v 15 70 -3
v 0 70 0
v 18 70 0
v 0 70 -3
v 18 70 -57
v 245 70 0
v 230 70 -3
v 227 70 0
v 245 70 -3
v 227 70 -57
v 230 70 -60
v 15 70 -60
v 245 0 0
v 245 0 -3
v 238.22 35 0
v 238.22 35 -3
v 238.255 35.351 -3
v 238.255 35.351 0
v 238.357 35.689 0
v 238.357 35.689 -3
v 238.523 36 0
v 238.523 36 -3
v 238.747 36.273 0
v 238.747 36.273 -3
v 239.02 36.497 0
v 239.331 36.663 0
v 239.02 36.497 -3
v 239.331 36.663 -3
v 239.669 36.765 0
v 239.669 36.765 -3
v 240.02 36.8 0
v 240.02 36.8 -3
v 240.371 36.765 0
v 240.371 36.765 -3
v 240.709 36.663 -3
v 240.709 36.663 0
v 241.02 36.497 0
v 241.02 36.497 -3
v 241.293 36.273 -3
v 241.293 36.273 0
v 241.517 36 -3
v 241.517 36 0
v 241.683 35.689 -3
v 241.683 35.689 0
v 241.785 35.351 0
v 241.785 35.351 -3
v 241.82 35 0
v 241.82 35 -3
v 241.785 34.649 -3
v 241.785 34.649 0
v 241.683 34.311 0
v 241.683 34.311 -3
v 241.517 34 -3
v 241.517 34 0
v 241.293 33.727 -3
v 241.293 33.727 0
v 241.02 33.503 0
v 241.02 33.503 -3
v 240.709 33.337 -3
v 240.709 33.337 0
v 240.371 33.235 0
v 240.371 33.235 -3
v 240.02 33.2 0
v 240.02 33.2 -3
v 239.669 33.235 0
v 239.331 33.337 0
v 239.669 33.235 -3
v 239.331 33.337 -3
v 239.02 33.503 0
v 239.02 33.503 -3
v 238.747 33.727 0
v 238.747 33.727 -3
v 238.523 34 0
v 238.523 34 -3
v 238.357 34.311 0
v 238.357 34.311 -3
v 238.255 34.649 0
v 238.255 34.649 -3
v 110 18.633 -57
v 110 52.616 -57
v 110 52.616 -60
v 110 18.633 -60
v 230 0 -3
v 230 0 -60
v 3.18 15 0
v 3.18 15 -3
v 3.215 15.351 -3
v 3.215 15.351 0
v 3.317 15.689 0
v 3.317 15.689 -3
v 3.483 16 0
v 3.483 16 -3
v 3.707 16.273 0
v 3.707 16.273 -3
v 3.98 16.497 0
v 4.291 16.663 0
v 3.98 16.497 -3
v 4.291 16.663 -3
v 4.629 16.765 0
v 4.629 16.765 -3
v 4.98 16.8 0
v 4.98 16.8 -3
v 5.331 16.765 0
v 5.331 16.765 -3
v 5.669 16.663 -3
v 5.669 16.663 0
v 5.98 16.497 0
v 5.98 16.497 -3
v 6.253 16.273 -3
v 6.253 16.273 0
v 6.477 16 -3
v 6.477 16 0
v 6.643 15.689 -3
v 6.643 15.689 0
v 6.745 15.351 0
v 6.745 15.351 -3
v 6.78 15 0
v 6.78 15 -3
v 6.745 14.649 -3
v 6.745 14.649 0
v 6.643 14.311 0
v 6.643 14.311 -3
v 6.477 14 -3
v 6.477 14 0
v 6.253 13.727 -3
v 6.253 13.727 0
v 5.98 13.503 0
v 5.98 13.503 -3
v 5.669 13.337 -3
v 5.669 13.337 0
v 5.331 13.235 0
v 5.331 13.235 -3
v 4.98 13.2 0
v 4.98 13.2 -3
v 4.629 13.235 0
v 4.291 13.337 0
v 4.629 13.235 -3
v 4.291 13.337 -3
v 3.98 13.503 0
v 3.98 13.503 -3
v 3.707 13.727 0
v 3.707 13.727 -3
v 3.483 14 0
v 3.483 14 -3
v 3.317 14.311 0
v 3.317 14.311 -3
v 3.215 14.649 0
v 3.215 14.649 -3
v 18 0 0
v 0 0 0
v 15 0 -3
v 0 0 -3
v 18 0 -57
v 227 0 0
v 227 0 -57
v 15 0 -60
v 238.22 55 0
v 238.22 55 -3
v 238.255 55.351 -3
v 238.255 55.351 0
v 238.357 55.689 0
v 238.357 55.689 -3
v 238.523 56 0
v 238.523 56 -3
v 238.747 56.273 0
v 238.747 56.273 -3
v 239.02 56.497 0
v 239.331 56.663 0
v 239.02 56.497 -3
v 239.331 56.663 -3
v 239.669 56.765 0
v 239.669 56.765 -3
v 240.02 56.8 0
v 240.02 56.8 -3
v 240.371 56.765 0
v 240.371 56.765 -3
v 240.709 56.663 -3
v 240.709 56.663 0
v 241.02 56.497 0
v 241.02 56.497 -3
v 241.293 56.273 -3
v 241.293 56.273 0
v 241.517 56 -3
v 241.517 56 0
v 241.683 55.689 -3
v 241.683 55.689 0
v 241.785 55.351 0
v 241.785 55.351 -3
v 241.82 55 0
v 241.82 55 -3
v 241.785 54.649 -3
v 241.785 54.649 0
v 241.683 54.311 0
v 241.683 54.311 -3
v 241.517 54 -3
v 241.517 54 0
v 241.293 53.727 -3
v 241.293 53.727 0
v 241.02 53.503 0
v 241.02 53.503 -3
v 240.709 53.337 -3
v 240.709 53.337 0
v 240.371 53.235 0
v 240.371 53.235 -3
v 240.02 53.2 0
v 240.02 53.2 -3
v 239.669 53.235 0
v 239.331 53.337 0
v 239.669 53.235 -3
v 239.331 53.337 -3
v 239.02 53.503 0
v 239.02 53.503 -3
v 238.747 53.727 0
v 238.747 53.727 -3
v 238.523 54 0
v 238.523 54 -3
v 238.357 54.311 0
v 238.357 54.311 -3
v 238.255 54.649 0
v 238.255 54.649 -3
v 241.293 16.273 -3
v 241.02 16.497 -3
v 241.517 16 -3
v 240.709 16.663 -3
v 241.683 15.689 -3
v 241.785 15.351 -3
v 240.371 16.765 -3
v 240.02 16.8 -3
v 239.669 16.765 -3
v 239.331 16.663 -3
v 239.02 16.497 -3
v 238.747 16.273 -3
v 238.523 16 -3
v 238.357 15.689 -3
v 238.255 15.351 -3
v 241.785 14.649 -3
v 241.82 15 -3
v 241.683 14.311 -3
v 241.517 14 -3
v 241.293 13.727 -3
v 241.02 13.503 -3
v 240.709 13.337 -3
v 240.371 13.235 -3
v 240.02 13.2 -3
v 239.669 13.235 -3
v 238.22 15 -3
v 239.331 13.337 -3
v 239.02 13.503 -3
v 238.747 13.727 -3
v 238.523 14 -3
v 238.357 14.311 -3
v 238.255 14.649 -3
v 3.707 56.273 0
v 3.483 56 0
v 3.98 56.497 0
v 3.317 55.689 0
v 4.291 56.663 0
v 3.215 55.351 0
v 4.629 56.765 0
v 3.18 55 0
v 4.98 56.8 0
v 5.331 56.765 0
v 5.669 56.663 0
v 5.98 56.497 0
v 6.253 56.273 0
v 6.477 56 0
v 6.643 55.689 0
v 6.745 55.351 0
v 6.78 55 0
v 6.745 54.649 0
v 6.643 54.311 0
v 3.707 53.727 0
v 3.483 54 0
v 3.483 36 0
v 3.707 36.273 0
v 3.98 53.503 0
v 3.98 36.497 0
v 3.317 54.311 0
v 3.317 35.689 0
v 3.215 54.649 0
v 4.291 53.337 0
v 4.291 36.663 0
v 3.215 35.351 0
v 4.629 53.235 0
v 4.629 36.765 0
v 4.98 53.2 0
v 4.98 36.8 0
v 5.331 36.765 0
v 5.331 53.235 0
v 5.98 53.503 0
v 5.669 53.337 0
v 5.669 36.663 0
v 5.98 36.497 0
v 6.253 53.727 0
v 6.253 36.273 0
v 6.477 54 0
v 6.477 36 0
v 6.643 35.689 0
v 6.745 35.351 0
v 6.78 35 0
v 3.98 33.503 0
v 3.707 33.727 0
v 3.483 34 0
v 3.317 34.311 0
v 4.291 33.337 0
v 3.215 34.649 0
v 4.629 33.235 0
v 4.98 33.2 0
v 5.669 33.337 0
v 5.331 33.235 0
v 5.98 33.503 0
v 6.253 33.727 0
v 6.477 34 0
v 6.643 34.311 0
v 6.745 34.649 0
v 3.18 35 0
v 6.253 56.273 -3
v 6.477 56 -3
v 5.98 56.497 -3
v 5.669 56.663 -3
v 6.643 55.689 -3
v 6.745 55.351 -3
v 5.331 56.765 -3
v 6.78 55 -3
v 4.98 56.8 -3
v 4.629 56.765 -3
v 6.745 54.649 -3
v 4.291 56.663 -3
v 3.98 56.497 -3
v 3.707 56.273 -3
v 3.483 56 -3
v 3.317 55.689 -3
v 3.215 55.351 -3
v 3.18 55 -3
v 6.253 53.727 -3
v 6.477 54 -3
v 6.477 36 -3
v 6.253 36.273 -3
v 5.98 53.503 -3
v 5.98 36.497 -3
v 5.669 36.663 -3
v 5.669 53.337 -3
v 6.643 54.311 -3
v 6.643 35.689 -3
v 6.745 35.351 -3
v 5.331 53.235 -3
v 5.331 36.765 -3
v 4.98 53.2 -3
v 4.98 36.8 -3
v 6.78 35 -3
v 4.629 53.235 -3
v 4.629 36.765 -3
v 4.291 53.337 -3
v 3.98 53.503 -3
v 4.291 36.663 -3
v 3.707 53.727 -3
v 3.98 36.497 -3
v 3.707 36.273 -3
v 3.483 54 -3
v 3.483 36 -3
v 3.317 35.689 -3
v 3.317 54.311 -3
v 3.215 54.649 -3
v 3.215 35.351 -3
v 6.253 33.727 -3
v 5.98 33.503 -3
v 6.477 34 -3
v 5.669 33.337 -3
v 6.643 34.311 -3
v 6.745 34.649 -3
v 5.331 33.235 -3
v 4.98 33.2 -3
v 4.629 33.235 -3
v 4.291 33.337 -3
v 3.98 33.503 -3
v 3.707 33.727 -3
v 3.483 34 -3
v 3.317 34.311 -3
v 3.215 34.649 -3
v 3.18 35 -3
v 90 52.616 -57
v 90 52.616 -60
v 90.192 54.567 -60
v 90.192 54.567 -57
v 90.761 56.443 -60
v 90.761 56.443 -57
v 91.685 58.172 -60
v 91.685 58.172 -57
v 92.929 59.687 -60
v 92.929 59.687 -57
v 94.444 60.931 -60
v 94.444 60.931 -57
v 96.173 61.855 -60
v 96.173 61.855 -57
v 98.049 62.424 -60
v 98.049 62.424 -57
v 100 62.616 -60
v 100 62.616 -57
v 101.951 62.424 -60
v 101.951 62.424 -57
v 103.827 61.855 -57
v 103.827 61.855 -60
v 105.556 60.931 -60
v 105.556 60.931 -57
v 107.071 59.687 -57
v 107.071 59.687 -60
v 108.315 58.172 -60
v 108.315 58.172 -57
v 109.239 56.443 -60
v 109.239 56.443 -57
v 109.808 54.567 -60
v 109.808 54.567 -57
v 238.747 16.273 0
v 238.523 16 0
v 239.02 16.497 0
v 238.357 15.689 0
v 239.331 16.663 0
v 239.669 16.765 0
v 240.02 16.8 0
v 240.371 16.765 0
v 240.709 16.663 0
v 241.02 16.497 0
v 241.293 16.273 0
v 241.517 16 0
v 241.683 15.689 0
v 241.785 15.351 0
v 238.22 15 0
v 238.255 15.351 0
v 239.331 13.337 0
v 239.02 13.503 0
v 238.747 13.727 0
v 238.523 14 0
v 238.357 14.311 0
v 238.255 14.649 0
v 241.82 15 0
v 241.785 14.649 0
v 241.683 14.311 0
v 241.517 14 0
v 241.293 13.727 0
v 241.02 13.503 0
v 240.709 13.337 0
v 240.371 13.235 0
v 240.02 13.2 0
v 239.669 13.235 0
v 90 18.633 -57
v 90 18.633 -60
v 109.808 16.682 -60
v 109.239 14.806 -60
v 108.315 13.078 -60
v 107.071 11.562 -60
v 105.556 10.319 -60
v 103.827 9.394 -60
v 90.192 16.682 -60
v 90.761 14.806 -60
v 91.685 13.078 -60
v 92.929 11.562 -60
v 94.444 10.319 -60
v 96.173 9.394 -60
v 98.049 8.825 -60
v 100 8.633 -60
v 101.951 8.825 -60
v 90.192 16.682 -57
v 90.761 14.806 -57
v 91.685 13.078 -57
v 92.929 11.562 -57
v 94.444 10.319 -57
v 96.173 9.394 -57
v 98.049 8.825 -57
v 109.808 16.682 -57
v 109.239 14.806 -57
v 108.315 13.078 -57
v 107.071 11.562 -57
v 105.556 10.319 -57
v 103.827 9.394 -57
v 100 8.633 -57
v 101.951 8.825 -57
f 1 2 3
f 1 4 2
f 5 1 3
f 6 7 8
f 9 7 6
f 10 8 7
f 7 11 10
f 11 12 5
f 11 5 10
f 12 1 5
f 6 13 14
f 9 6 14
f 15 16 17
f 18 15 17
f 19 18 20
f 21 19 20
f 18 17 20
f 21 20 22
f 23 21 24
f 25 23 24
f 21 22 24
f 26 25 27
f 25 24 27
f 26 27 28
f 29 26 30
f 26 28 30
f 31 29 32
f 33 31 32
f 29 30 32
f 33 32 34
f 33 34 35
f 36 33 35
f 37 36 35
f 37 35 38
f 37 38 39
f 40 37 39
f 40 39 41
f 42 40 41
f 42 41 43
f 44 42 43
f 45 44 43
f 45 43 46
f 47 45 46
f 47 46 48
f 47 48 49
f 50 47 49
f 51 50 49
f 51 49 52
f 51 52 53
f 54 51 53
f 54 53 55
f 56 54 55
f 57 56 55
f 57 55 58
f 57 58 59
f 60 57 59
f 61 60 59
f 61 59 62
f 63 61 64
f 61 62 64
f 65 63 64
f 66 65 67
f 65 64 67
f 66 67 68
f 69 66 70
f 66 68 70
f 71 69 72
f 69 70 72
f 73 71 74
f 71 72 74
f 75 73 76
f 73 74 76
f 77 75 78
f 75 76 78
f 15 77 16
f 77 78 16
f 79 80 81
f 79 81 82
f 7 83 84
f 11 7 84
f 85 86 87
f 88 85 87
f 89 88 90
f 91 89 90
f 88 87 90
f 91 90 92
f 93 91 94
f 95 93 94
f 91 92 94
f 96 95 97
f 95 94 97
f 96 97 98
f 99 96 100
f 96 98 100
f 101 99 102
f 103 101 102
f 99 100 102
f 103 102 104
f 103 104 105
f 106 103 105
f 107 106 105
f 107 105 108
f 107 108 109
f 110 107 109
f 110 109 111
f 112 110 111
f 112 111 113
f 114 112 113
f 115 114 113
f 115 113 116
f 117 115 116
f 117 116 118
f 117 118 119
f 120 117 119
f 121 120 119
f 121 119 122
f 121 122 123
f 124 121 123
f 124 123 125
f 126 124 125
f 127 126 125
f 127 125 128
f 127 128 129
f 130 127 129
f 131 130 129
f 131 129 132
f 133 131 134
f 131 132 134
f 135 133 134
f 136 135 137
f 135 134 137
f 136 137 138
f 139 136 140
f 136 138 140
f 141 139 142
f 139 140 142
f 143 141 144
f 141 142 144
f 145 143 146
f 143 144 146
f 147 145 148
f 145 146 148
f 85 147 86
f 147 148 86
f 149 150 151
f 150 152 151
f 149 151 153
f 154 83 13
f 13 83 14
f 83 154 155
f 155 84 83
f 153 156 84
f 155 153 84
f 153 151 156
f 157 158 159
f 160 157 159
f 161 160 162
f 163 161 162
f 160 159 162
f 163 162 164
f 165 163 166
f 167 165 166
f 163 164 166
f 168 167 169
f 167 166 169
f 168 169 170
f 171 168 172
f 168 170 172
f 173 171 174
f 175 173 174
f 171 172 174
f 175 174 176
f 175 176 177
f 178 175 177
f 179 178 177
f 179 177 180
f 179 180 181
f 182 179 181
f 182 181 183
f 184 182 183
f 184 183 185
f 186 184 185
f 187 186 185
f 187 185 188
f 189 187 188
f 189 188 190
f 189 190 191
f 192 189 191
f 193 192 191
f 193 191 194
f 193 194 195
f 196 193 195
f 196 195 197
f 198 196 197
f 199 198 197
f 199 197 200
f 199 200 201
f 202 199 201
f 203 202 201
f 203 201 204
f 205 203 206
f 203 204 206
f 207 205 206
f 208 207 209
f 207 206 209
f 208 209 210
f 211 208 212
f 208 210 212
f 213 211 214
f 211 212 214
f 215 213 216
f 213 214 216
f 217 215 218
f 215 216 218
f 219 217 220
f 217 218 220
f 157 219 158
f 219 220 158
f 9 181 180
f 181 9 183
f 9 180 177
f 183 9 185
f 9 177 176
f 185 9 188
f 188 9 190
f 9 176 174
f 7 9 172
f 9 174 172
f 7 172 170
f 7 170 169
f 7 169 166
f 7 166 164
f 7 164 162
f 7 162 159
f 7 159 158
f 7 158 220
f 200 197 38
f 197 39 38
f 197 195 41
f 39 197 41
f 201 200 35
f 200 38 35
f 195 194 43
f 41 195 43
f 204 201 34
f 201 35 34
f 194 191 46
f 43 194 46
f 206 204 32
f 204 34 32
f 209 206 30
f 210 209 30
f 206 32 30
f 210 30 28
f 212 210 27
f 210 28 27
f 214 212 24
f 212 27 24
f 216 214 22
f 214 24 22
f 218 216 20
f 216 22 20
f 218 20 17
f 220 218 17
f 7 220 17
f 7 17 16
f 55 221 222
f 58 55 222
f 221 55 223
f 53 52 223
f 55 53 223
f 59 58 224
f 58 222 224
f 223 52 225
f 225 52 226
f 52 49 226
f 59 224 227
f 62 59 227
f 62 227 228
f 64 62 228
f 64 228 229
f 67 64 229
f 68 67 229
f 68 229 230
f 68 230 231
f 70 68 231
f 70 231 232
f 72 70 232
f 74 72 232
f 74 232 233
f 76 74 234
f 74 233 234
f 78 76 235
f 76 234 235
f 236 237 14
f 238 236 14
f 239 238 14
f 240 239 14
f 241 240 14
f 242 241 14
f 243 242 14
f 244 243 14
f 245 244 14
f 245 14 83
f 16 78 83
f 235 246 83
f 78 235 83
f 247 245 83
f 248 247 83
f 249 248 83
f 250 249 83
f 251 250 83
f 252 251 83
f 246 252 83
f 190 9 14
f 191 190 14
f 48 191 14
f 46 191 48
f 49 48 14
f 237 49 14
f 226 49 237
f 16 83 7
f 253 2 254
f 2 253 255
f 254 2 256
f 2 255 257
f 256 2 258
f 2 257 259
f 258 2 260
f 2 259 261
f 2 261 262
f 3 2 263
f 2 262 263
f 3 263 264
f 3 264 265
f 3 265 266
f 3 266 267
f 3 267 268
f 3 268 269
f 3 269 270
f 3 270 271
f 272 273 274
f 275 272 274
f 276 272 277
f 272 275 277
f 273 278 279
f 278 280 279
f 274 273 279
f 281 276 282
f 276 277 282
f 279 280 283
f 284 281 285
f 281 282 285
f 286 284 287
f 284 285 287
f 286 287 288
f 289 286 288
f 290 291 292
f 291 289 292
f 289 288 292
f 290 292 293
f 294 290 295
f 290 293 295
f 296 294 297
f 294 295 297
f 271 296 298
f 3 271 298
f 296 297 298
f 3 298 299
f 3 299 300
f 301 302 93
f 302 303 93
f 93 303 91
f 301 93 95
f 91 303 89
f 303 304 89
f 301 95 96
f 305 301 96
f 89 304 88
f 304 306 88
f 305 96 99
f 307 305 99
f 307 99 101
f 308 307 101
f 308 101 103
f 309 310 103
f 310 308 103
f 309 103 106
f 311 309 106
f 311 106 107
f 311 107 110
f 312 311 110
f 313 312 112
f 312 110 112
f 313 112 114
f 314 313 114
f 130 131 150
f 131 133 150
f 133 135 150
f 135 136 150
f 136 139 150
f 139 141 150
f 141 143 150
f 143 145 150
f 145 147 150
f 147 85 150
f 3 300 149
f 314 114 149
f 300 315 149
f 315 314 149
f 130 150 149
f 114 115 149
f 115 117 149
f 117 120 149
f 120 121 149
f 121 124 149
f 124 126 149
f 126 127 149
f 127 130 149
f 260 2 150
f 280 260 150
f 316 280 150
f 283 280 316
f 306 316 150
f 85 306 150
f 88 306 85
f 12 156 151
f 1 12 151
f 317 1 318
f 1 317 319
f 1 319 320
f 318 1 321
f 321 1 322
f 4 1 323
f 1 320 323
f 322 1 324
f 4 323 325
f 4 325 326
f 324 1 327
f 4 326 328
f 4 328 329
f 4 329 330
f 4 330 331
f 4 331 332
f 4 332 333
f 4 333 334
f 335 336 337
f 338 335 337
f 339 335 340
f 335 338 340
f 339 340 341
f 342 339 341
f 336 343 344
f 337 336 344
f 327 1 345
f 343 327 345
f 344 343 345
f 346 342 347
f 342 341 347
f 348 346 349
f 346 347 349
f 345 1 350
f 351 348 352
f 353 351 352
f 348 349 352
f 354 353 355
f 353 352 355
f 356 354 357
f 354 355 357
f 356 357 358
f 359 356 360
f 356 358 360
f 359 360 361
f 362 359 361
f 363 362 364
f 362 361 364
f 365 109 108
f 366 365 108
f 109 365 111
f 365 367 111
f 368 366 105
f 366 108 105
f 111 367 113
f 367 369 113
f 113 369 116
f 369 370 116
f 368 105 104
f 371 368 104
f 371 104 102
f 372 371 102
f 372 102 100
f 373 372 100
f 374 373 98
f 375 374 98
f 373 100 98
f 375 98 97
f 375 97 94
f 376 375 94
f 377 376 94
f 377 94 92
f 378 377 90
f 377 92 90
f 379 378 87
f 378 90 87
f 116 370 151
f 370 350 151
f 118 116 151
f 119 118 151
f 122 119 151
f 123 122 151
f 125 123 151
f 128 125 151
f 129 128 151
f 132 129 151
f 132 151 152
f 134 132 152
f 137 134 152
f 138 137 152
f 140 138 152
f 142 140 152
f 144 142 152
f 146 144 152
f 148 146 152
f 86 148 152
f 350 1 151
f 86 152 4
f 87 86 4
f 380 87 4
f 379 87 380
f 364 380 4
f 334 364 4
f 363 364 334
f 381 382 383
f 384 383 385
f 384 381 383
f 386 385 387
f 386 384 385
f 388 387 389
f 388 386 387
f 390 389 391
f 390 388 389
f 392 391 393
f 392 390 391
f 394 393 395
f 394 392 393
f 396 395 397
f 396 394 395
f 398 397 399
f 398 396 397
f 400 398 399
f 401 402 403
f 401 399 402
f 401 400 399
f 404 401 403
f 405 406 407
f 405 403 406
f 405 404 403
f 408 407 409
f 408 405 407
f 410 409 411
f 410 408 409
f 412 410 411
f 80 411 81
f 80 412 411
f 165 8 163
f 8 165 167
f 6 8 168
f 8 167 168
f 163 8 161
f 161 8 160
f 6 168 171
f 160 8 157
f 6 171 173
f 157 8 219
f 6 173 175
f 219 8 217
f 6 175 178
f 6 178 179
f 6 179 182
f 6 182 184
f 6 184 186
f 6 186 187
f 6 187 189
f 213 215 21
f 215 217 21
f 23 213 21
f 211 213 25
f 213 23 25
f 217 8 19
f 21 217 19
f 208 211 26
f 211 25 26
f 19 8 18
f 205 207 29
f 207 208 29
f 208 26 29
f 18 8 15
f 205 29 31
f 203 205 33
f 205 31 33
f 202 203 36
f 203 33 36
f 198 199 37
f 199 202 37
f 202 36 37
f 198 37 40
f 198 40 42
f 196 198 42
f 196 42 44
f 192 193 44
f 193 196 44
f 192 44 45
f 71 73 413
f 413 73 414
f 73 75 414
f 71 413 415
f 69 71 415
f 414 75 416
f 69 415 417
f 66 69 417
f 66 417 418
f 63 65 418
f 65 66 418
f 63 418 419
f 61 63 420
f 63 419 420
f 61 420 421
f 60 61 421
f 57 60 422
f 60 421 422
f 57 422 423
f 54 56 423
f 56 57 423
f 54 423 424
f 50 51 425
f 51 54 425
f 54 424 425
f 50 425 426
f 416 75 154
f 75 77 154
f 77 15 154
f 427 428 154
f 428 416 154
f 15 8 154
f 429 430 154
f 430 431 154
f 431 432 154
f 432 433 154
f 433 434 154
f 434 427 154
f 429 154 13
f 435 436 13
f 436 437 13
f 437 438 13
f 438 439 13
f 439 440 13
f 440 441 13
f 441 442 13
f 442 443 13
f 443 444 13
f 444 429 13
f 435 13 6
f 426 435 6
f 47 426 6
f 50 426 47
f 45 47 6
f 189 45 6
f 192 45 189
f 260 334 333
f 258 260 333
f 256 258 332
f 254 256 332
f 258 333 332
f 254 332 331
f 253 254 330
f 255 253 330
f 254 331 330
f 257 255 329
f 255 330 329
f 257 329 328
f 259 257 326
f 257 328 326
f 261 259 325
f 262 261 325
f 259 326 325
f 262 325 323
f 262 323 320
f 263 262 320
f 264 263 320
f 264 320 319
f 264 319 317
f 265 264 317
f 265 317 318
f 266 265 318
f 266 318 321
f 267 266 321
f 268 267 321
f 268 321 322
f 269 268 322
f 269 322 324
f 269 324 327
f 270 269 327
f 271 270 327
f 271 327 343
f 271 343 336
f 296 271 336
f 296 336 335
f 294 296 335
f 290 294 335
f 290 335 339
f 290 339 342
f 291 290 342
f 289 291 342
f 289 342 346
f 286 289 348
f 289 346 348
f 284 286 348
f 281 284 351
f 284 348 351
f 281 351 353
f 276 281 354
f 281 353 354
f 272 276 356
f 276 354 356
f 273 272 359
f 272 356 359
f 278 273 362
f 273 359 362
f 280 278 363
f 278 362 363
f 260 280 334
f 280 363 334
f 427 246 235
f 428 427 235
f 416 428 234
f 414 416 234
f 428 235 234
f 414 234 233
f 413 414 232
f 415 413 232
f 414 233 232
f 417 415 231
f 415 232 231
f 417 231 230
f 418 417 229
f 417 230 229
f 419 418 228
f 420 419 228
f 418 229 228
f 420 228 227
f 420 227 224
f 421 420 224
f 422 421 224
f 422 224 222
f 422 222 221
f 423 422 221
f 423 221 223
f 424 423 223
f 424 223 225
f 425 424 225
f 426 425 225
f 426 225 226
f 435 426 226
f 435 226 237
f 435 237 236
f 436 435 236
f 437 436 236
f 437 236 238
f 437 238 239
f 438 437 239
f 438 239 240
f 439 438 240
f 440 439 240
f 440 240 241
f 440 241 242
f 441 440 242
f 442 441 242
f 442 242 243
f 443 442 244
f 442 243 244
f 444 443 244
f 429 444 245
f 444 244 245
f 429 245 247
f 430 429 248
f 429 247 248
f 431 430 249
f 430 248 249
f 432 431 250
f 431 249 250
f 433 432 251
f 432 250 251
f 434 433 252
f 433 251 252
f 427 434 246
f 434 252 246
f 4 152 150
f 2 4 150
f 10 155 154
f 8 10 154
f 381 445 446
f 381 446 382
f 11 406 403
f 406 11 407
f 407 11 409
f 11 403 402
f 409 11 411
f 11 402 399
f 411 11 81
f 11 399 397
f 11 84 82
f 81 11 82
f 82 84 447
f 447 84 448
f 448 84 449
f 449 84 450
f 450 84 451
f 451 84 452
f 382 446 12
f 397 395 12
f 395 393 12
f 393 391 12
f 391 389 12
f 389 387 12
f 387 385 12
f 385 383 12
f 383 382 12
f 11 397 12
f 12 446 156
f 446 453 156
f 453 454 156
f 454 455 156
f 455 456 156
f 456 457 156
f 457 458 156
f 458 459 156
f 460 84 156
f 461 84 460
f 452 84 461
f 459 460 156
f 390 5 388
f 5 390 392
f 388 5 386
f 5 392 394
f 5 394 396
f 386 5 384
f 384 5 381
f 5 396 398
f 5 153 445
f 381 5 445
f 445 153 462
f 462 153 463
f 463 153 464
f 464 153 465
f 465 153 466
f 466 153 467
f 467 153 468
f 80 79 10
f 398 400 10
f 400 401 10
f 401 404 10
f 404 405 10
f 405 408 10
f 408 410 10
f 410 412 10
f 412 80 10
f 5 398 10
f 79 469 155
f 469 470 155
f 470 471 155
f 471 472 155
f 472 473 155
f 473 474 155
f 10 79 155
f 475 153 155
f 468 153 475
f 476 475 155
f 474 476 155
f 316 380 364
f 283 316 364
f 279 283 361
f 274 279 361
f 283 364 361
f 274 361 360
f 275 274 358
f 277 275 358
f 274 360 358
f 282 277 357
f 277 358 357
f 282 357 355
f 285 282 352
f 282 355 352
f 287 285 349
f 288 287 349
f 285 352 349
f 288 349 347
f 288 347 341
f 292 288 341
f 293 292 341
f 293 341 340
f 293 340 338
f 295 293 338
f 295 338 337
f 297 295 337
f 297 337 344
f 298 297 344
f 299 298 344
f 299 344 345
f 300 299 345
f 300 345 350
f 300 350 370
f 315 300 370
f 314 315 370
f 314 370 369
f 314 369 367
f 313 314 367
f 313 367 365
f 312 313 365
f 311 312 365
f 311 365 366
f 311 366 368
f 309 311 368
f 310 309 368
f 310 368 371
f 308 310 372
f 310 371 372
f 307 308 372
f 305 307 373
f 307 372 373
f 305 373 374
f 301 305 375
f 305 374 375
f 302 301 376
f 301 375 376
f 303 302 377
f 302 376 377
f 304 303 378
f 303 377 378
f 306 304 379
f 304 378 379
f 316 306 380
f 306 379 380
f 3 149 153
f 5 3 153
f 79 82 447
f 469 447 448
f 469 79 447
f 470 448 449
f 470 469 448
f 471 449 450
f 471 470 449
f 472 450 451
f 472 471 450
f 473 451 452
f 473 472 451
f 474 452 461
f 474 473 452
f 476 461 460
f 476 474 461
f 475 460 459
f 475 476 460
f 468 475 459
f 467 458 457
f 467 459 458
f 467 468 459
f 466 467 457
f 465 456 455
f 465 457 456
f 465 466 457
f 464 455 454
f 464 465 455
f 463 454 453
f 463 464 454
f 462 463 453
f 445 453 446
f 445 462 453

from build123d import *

# Parameters (mm, degrees)
BOSS_EXTRUDE1_DEPTH = 70
SKETCH2_R           = 1.8
CUT_EXTRUDE1_DEPTH  = 262.101512826
CUT_EXTRUDE2_REACH  = 263.102


with BuildPart() as part:
    # Sketch1 → Boss-Extrude1 (new body)
    with BuildSketch(Plane(origin=(0, 0, 0), x_dir=(1, 0, 0), z_dir=(0, 1, 0))):
        Polygon((0, 0), (18, 0), (18, 57), (227, 57), (227, 0), (245, 0), (245, 3), (230, 3), (230, 60), (15, 60), (15, 3), (0, 3), align=None)
    extrude(amount=BOSS_EXTRUDE1_DEPTH)

    # Sketch2 → Cut-Extrude1 (cut, through all)
    with BuildSketch(Plane(origin=(0, 0, -3), x_dir=(-1, 0, 0), z_dir=(0, 0, -1))):
        with Locations((-240.02, 55)):
            Circle(SKETCH2_R)
        with Locations((-240.02, 35)):
            Circle(SKETCH2_R)
        with Locations((-240.02, 15)):
            Circle(SKETCH2_R)
        with Locations((-4.98, 15)):
            Circle(SKETCH2_R)
        with Locations((-4.98, 35)):
            Circle(SKETCH2_R)
        with Locations((-4.98, 55)):
            Circle(SKETCH2_R)
    extrude(amount=-CUT_EXTRUDE1_DEPTH, mode=Mode.SUBTRACT)

    # Sketch3 → Cut-Extrude2 (cut, up to next)
    with BuildSketch(Plane.XY.offset(-57), mode=Mode.PRIVATE) as cut_extrude2_sk1:
        with BuildLine():
            Line((110, 52.616114621), (110, 18.63325521))
            ThreePointArc((110, 18.63325521), (100, 8.63325521), (90, 18.63325521))
            Line((90, 18.63325521), (90, 52.616114621))
            ThreePointArc((90, 52.616114621), (100, 62.616114621), (110, 52.616114621))
        make_face()
    cut_extrude2_tool1 = extrude(cut_extrude2_sk1.sketch, amount=-CUT_EXTRUDE2_REACH, mode=Mode.PRIVATE) & part.part
    add(cut_extrude2_tool1.solids().sort_by_distance((100, 35.624685, -57))[0], mode=Mode.SUBTRACT)


solid = part.part
